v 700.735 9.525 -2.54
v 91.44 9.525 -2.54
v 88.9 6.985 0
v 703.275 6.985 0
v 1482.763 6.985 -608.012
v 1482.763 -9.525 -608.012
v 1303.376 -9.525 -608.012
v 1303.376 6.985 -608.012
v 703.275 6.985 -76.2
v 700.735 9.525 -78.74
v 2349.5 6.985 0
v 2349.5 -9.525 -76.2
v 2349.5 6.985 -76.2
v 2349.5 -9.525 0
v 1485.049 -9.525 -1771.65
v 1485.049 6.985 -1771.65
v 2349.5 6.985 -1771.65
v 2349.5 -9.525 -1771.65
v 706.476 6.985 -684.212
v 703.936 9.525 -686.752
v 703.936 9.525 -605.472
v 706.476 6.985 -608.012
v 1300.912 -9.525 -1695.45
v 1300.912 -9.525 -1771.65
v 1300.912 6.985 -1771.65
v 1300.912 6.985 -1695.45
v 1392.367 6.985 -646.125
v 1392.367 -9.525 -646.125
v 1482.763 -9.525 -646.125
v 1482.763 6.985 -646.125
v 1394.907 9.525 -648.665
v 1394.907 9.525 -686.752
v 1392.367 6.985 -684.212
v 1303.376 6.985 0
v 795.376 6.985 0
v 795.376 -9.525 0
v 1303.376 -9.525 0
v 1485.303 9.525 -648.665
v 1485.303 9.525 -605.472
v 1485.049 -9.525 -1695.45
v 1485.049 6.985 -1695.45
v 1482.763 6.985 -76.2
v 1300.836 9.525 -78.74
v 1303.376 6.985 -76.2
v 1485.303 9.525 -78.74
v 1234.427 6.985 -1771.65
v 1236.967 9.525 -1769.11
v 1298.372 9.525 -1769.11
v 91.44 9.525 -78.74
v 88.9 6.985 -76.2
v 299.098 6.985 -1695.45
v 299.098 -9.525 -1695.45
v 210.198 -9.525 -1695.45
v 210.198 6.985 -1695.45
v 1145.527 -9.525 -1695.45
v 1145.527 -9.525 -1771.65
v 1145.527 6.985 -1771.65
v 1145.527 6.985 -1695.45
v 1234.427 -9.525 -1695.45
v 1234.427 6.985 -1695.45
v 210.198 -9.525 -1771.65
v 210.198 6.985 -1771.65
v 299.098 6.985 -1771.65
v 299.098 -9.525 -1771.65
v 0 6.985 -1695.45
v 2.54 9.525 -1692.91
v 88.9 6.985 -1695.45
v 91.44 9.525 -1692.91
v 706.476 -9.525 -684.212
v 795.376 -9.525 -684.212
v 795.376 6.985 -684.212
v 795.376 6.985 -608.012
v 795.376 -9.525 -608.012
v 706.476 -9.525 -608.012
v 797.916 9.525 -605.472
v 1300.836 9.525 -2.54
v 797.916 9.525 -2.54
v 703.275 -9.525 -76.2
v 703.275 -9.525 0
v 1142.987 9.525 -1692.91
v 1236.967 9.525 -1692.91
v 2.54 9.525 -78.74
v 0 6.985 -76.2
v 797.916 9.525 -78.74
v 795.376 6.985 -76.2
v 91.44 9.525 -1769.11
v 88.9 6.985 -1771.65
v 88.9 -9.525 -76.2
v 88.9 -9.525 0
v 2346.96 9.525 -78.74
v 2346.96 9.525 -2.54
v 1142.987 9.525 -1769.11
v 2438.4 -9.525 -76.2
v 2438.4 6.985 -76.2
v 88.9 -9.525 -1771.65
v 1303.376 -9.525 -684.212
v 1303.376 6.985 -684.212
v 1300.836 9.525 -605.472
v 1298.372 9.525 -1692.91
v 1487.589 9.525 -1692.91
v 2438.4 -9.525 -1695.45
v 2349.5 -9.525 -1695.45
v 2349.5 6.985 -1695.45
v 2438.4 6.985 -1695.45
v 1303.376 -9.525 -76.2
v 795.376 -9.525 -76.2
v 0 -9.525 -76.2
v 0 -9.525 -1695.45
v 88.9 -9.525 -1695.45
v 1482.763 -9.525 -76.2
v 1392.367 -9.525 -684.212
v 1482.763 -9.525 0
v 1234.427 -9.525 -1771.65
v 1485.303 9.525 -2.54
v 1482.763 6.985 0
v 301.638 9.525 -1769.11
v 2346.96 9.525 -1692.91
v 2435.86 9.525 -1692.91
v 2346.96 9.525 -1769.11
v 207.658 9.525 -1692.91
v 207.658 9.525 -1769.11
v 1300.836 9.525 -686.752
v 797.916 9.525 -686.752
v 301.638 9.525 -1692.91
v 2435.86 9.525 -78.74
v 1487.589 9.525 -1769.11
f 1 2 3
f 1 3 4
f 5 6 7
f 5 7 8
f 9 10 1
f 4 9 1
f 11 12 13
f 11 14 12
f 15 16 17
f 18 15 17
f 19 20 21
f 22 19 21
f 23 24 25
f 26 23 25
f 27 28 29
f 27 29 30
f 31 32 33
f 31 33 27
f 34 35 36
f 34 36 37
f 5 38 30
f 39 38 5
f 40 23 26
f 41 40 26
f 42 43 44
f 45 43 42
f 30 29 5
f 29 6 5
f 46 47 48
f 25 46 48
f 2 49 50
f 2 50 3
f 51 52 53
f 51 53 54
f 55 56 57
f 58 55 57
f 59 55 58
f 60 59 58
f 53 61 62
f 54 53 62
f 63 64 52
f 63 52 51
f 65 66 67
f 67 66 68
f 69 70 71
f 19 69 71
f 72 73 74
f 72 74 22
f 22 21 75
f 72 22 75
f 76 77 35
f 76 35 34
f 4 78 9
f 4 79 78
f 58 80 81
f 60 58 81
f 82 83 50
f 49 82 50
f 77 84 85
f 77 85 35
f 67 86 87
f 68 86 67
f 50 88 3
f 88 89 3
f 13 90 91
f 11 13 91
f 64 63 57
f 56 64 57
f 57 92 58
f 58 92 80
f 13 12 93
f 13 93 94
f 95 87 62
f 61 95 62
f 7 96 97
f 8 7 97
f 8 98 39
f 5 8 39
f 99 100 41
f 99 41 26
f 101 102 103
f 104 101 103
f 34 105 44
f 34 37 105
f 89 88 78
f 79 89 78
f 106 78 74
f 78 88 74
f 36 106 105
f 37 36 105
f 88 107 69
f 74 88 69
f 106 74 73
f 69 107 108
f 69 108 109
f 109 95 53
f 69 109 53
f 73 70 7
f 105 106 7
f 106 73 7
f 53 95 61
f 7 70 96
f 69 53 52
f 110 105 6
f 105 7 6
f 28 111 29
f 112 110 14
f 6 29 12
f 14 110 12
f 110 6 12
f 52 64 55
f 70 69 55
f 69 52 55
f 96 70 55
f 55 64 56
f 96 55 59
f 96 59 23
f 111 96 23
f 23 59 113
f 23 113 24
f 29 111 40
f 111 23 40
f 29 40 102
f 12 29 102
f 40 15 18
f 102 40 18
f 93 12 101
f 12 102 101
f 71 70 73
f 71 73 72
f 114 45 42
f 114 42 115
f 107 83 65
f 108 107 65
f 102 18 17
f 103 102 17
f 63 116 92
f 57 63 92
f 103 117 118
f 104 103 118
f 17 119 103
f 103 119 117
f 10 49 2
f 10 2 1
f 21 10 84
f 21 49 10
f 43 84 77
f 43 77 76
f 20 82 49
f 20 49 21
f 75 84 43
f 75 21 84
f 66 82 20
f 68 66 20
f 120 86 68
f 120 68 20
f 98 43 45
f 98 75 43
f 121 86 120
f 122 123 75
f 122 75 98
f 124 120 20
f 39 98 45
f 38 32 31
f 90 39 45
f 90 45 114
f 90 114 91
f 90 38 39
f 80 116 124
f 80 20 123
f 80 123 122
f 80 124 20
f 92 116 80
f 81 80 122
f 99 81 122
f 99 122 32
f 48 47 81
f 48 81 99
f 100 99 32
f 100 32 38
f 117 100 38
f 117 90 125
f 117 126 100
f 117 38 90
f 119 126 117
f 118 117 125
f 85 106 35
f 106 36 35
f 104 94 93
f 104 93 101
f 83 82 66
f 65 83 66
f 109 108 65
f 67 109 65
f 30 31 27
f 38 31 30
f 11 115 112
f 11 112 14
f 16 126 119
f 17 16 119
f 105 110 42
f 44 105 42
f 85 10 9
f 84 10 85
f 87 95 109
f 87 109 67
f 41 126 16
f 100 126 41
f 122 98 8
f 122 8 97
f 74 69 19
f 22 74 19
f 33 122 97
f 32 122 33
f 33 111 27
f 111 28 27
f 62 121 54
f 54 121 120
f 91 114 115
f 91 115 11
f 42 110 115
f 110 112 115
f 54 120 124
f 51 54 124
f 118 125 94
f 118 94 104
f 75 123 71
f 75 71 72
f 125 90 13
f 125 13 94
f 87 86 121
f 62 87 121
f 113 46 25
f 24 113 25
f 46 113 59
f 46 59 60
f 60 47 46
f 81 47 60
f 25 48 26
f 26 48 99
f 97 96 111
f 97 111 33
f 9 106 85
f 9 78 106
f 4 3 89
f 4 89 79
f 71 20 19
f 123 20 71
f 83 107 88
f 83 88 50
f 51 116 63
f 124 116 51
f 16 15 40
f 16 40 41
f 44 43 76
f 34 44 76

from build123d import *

# Parameters (mm, degrees)
SKETCH1_W                = 2438.4
SKETCH1_H                = 1771.65
BOSS_EXTRUDE1_DEPTH      = 9.525
CUT_EXTRUDE2_START       = 1303.3756
CUT_EXTRUDE2_OUTLINE_W   = 19.05
CUT_EXTRUDE2_OUTLINE_H   = 76.2
CUT_EXTRUDE2_OUTLINE_H_2 = 38.1127
CUT_EXTRUDE2_DEPTH       = 179.3875
CUT_EXTRUDE2_2_OUTLINE_W = 19.05
CUT_EXTRUDE2_2_OUTLINE_H = 76.2
CUT_EXTRUDE2_2_DEPTH     = 88.9
CUT_EXTRUDE2_START_2     = 706.4756
CUT_EXTRUDE2_3_OUTLINE_W = 19.05
CUT_EXTRUDE2_3_OUTLINE_H = 76.2
CUT_EXTRUDE2_3_DEPTH     = 88.9
CUT_EXTRUDE2_START_3     = 2349.5
CUT_EXTRUDE2_4_OUTLINE_W = 19.05
CUT_EXTRUDE2_4_OUTLINE_H = 76.2
CUT_EXTRUDE2_4_DEPTH     = 88.9
CUT_EXTRUDE2_START_4     = 210.1977
CUT_EXTRUDE2_5_OUTLINE_W = 19.05
CUT_EXTRUDE2_5_OUTLINE_H = 76.2
CUT_EXTRUDE2_5_DEPTH     = 88.9
CUT_EXTRUDE2_START_5     = 1145.5273
CUT_EXTRUDE2_6_OUTLINE_W = 19.05
CUT_EXTRUDE2_6_OUTLINE_H = 76.2
CUT_EXTRUDE2_6_DEPTH     = 88.9
CUT_EXTRUDE2_7_OUTLINE_W = 19.05
CUT_EXTRUDE2_7_OUTLINE_H = 38.0873
CUT_EXTRUDE2_7_DEPTH     = 88.991565563
CUT_EXTRUDE2_START_6     = 1300.9118
CUT_EXTRUDE2_8_OUTLINE_W = 19.05
CUT_EXTRUDE2_8_OUTLINE_H = 76.2
CUT_EXTRUDE2_8_DEPTH     = 184.1373
CUT_EXTRUDE2_START_7     = 703.2752
CUT_EXTRUDE2_9_OUTLINE_W = 19.05
CUT_EXTRUDE2_9_OUTLINE_H = 76.2
CUT_EXTRUDE2_9_DEPTH     = 3.2004
CHAMFER1_SIZE            = 2.54


# Read off the part's stored shape, not the designer's step: Cut-Extrude2
with BuildPart() as part:
    # Sketch1 → Boss-Extrude1 (new, symmetric)
    with BuildSketch(Plane(origin=(0, 0, 0), x_dir=(1, 0, 0), z_dir=(0, 1, 0))):
        with Locations((1219.2, 885.825)):
            Rectangle(SKETCH1_W, SKETCH1_H)
    extrude(amount=BOSS_EXTRUDE1_DEPTH, both=True)

    # Cut-Extrude2 outline → Cut-Extrude2 (cut)
    with BuildSketch(Plane.YZ.offset(CUT_EXTRUDE2_START)):
        with Locations((0, -1733.55)):
            Rectangle(CUT_EXTRUDE2_OUTLINE_W, CUT_EXTRUDE2_OUTLINE_H)
        with Locations((0, -627.068849999)):
            Rectangle(CUT_EXTRUDE2_OUTLINE_W, CUT_EXTRUDE2_OUTLINE_H_2)
        with Locations((0, -38.1)):
            Rectangle(CUT_EXTRUDE2_OUTLINE_W, CUT_EXTRUDE2_OUTLINE_H)
    extrude(amount=CUT_EXTRUDE2_DEPTH, mode=Mode.SUBTRACT)

    # Cut-Extrude2 2 outline → Cut-Extrude2 2 (cut)
    with BuildSketch(Plane.YZ):
        with Locations((0, -1733.55)):
            Rectangle(CUT_EXTRUDE2_2_OUTLINE_W, CUT_EXTRUDE2_2_OUTLINE_H)
        with Locations((0, -38.1)):
            Rectangle(CUT_EXTRUDE2_2_OUTLINE_W, CUT_EXTRUDE2_2_OUTLINE_H)
    extrude(amount=CUT_EXTRUDE2_2_DEPTH, mode=Mode.SUBTRACT)

    # Cut-Extrude2 3 outline → Cut-Extrude2 3 (cut)
    with BuildSketch(Plane.YZ.offset(CUT_EXTRUDE2_START_2)):
        with Locations((0, -646.112499999)):
            Rectangle(CUT_EXTRUDE2_3_OUTLINE_W, CUT_EXTRUDE2_3_OUTLINE_H)
        with Locations((0, -38.1)):
            Rectangle(CUT_EXTRUDE2_3_OUTLINE_W, CUT_EXTRUDE2_3_OUTLINE_H)
    extrude(amount=CUT_EXTRUDE2_3_DEPTH, mode=Mode.SUBTRACT)

    # Cut-Extrude2 4 outline → Cut-Extrude2 4 (cut)
    with BuildSketch(Plane.YZ.offset(CUT_EXTRUDE2_START_3)):
        with Locations((0, -1733.55)):
            Rectangle(CUT_EXTRUDE2_4_OUTLINE_W, CUT_EXTRUDE2_4_OUTLINE_H)
        with Locations((0, -38.1)):
            Rectangle(CUT_EXTRUDE2_4_OUTLINE_W, CUT_EXTRUDE2_4_OUTLINE_H)
    extrude(amount=CUT_EXTRUDE2_4_DEPTH, mode=Mode.SUBTRACT)

    # Cut-Extrude2 5 outline → Cut-Extrude2 5 (cut)
    with BuildSketch(Plane.YZ.offset(CUT_EXTRUDE2_START_4)):
        with Locations((0, -1733.55)):
            Rectangle(CUT_EXTRUDE2_5_OUTLINE_W, CUT_EXTRUDE2_5_OUTLINE_H)
    extrude(amount=CUT_EXTRUDE2_5_DEPTH, mode=Mode.SUBTRACT)

    # Cut-Extrude2 6 outline → Cut-Extrude2 6 (cut)
    with BuildSketch(Plane.YZ.offset(CUT_EXTRUDE2_START_5)):
        with Locations((0, -1733.55)):
            Rectangle(CUT_EXTRUDE2_6_OUTLINE_W, CUT_EXTRUDE2_6_OUTLINE_H)
    extrude(amount=CUT_EXTRUDE2_6_DEPTH, mode=Mode.SUBTRACT)

    # Cut-Extrude2 7 outline → Cut-Extrude2 7 (cut)
    with BuildSketch(Plane.YZ.offset(CUT_EXTRUDE2_START)):
        with Locations((0, -665.168849999)):
            Rectangle(CUT_EXTRUDE2_7_OUTLINE_W, CUT_EXTRUDE2_7_OUTLINE_H)
    extrude(amount=CUT_EXTRUDE2_7_DEPTH, mode=Mode.SUBTRACT)

    # Cut-Extrude2 8 outline → Cut-Extrude2 8 (cut)
    with BuildSketch(Plane.YZ.offset(CUT_EXTRUDE2_START_6)):
        with Locations((0, -1733.55)):
            Rectangle(CUT_EXTRUDE2_8_OUTLINE_W, CUT_EXTRUDE2_8_OUTLINE_H)
    extrude(amount=CUT_EXTRUDE2_8_DEPTH, mode=Mode.SUBTRACT)

    # Cut-Extrude2 9 outline → Cut-Extrude2 9 (cut)
    with BuildSketch(Plane.YZ.offset(CUT_EXTRUDE2_START_7)):
        with Locations((0, -38.1)):
            Rectangle(CUT_EXTRUDE2_9_OUTLINE_W, CUT_EXTRUDE2_9_OUTLINE_H)
    extrude(amount=CUT_EXTRUDE2_9_DEPTH, mode=Mode.SUBTRACT)

    # Chamfer1
    chamfer1_edges = [part.edges().sort_by_distance(p)[0] for p in [
        (1300.9118, 9.525, -1733.55),
        (1392.98045, 9.525, -1695.45),
        (1485.0491, 9.525, -1733.55),
        (2349.5, 9.525, -1733.55),
        (2393.95, 9.525, -1695.45),
        (706.4756, 9.525, -646.112499999),
        (750.9256, 9.525, -608.012499999),
        (795.3756, 9.525, -646.112499999),
        (750.9256, 9.525, -684.212499999),
        (2393.95, 9.525, -76.2),
        (2349.5, 9.525, -38.1),
        (1145.5273, 9.525, -1733.55),
        (1189.9773, 9.525, -1695.45),
        (1234.4273, 9.525, -1733.55),
        (44.45, 9.525, -1695.45),
        (88.9, 9.525, -1733.55),
        (0, 9.525, -885.825),
        (396.0876, 9.525, 0),
        (1049.3756, 9.525, 0),
        (1916.13155, 9.525, 0),
        (2438.4, 9.525, -885.825),
        (1917.27455, 9.525, -1771.65),
        (1267.66955, 9.525, -1771.65),
        (722.3125, 9.525, -1771.65),
        (149.54885, 9.525, -1771.65),
        (1303.3756, 9.525, -646.112499999),
        (1393.06935, 9.525, -608.012499999),
        (1482.7631, 9.525, -627.068849999),
        (1437.565132782, 9.525, -646.125199999),
        (1392.367165563, 9.525, -665.168849999),
        (1347.871382781, 9.525, -684.212499999),
        (88.9, 9.525, -38.1),
        (44.45, 9.525, -76.2),
        (795.3756, 9.525, -38.1),
        (749.3254, 9.525, -76.2),
        (703.2752, 9.525, -38.1),
        (1482.7631, 9.525, -38.1),
        (1393.06935, 9.525, -76.2),
        (1303.3756, 9.525, -38.1),
        (210.1977, 9.525, -1733.55),
        (254.6477, 9.525, -1695.45),
        (299.0977, 9.525, -1733.55),
    ]]
    chamfer(chamfer1_edges, length=CHAMFER1_SIZE)


solid = part.part
